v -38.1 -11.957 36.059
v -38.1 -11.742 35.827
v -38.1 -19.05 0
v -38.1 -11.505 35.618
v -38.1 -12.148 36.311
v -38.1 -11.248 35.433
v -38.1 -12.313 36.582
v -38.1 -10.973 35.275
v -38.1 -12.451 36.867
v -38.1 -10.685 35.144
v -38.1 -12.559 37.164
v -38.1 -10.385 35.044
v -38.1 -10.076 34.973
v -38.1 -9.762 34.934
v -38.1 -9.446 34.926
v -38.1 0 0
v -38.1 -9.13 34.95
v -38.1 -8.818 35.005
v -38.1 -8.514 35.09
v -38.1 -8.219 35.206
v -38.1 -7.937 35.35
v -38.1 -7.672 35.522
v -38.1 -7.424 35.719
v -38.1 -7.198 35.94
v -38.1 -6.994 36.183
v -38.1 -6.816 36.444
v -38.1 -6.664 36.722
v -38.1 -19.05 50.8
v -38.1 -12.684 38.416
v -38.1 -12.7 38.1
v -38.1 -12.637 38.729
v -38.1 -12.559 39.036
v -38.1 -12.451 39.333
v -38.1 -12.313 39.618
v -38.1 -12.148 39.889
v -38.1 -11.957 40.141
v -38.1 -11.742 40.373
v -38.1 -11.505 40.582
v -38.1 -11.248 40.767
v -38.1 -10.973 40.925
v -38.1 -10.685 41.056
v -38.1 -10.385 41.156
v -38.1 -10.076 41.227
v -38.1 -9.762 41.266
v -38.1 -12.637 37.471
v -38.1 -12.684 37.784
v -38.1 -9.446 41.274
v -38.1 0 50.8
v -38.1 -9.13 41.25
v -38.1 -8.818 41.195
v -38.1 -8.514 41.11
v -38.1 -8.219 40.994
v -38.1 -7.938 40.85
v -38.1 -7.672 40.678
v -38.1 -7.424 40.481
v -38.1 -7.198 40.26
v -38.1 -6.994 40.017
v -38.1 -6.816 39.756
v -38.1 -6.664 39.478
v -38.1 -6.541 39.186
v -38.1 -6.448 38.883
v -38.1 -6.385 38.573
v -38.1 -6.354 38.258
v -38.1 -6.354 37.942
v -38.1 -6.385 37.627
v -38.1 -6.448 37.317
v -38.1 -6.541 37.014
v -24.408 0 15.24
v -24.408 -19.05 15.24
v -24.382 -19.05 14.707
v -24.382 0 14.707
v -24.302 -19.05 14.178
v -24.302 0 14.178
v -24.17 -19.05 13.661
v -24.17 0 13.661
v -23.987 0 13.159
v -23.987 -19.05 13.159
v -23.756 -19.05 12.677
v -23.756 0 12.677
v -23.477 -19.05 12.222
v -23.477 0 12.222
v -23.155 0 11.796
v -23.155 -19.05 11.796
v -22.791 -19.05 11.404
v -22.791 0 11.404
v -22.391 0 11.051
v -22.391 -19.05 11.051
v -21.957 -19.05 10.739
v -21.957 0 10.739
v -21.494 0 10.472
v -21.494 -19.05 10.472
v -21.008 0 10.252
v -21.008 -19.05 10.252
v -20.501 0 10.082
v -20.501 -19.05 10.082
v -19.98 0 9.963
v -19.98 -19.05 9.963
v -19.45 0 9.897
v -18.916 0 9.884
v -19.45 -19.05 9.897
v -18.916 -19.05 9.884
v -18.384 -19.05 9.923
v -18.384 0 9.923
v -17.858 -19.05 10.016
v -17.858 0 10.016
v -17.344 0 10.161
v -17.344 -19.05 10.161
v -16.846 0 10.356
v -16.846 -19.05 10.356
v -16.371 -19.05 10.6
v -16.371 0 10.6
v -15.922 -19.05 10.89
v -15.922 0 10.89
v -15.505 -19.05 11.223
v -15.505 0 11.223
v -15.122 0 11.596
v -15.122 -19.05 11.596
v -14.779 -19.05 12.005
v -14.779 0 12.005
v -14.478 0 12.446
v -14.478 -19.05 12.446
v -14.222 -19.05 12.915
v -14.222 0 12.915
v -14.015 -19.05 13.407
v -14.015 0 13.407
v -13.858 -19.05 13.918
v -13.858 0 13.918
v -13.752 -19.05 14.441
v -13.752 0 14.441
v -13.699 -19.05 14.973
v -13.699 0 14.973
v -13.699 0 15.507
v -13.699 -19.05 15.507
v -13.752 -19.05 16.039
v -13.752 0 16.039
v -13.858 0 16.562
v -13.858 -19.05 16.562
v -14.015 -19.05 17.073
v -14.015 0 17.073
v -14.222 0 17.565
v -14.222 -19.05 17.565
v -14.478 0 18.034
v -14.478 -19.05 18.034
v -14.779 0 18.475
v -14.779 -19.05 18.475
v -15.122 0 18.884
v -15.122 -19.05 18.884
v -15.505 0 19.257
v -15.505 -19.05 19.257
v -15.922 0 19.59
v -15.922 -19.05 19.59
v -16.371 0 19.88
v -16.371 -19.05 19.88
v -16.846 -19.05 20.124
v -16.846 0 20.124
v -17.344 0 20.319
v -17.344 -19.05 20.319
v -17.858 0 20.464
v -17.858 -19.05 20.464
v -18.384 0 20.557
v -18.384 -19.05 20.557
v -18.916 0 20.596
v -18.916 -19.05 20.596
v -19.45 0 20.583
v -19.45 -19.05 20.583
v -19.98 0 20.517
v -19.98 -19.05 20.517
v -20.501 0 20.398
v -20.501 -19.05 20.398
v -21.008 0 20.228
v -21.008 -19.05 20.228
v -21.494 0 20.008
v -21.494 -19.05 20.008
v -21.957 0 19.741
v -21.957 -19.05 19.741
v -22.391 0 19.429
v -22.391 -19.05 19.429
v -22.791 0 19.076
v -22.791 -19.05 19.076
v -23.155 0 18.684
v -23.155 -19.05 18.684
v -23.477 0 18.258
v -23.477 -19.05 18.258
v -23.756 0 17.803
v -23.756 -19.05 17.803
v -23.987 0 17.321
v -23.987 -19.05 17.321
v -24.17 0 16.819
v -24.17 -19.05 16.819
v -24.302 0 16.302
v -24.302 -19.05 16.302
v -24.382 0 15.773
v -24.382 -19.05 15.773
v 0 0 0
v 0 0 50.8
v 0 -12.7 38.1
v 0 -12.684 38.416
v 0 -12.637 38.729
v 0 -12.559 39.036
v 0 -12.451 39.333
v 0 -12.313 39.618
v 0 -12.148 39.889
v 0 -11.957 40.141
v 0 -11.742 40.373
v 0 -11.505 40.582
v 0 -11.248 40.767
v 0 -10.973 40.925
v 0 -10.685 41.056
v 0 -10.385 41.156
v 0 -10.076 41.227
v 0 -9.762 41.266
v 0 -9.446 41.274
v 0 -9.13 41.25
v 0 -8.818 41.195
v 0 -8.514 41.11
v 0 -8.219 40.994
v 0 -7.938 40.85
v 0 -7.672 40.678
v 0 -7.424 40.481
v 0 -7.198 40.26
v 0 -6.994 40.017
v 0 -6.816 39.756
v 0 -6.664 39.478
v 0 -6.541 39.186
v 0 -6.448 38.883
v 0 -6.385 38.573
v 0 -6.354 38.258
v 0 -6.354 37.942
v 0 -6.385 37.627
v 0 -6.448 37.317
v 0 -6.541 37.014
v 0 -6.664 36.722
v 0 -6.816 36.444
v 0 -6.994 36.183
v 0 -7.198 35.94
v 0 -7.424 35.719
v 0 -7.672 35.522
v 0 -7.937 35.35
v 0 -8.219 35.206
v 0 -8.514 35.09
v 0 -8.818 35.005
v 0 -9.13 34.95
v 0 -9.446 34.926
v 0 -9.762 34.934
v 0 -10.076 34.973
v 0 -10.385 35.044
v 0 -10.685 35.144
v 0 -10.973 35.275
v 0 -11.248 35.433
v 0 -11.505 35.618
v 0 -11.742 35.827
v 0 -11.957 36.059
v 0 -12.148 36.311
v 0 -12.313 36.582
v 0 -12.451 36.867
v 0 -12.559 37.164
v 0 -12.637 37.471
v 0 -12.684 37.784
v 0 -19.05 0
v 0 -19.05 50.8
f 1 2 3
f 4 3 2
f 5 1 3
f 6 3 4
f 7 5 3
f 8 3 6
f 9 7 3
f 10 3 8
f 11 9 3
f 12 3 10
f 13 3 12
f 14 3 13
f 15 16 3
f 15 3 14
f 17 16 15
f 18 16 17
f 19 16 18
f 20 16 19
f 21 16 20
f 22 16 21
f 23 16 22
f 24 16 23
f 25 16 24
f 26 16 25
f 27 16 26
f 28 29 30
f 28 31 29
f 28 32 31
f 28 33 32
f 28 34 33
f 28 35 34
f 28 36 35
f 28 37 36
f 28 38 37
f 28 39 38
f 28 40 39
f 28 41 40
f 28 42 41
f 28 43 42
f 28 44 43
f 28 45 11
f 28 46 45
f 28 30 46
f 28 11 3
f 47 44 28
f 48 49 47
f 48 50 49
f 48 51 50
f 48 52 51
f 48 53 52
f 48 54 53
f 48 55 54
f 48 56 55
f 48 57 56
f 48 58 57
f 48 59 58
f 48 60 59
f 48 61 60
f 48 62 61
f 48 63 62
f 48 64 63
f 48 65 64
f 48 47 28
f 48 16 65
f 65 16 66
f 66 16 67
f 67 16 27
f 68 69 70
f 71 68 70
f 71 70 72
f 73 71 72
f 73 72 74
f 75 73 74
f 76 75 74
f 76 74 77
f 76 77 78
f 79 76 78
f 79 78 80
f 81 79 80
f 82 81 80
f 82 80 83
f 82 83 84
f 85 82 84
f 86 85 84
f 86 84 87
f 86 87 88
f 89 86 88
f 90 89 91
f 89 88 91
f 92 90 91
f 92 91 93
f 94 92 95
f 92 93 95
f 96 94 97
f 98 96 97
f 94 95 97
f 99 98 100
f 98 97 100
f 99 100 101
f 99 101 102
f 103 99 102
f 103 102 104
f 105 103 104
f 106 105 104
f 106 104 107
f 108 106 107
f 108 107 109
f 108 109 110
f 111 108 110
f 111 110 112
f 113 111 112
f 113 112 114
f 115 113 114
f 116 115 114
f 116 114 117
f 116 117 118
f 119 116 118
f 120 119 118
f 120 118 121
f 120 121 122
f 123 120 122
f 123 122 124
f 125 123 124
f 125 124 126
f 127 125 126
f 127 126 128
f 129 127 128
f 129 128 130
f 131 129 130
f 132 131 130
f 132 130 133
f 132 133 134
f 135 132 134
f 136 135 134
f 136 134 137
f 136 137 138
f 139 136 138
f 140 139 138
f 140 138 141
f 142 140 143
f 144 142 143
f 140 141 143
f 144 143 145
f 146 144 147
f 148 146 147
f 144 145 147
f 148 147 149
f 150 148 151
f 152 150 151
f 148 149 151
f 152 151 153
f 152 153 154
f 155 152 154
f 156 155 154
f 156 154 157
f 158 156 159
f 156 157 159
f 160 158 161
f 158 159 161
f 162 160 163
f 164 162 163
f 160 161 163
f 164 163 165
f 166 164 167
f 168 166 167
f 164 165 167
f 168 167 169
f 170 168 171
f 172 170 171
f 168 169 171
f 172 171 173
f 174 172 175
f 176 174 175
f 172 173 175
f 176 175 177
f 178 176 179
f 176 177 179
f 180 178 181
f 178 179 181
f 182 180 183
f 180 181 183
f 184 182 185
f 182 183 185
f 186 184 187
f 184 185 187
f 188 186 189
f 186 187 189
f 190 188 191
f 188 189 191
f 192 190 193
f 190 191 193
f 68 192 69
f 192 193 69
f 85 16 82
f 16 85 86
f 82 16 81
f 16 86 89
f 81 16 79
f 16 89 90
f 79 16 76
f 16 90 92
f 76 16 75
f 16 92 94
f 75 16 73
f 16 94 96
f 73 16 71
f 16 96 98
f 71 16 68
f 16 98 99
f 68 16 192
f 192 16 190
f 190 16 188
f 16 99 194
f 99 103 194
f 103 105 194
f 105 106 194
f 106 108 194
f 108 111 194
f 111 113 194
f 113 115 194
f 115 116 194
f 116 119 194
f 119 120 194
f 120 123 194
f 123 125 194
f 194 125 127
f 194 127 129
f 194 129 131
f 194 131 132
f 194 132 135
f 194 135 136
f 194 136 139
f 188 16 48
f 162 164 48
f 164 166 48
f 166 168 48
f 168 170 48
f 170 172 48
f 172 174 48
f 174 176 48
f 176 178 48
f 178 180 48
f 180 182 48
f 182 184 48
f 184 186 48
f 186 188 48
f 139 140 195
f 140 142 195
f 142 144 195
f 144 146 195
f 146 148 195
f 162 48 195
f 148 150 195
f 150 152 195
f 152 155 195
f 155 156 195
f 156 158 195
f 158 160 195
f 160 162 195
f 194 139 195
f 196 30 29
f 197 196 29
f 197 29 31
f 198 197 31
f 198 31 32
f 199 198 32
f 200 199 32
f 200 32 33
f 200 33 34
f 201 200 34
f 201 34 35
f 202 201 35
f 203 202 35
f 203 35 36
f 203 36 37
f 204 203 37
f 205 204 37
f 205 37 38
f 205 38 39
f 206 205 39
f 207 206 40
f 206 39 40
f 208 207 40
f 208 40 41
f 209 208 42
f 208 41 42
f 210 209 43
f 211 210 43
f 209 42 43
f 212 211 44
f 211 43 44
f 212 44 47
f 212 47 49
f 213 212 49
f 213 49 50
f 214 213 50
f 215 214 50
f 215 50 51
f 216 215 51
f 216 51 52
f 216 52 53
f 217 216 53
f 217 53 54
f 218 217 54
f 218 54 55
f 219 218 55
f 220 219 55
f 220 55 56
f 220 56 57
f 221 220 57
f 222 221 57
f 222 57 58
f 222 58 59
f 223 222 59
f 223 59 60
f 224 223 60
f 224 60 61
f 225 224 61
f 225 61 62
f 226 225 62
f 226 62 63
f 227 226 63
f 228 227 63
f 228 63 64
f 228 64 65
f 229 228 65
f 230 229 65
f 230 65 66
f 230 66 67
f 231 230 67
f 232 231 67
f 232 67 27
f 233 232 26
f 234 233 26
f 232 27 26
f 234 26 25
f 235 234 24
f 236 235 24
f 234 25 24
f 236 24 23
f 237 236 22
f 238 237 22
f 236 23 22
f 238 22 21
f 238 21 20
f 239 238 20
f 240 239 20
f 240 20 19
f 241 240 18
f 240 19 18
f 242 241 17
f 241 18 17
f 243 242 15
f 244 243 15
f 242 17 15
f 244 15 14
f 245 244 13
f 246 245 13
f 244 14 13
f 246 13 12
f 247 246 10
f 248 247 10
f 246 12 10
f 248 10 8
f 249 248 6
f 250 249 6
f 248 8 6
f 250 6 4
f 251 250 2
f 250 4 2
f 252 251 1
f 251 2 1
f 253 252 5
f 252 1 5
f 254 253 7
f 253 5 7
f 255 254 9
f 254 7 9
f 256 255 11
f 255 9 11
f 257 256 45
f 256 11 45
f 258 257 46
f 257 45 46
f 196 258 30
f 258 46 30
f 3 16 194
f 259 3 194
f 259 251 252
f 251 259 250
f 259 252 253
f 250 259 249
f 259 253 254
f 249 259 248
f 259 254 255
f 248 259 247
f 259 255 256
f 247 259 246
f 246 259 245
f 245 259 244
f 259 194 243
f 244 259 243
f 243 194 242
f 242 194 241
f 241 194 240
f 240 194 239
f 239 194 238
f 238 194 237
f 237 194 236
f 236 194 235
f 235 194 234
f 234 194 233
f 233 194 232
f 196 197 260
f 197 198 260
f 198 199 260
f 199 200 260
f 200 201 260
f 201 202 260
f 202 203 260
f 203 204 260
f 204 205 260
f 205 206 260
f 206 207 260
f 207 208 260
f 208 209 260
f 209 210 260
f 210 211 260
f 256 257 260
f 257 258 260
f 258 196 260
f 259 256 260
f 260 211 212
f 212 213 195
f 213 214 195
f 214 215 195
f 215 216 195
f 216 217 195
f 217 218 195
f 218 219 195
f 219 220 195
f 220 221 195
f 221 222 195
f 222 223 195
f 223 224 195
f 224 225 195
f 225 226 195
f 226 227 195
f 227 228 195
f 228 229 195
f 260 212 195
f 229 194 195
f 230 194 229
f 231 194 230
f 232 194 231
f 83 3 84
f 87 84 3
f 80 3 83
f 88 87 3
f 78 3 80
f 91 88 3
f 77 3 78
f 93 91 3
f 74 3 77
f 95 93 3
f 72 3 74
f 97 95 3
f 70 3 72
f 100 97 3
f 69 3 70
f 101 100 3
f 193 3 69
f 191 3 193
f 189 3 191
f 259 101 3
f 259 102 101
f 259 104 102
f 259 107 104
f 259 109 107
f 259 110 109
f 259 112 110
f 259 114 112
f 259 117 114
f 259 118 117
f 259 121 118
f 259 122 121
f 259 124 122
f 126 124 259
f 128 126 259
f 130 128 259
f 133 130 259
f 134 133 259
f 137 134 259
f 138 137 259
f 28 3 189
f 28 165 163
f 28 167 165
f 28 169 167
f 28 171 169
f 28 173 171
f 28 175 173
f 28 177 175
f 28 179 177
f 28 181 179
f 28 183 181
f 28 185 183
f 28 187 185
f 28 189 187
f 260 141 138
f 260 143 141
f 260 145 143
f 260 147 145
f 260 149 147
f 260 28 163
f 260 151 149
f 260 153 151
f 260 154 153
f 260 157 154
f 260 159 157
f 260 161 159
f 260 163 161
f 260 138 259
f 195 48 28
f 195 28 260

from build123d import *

# Parameters (mm, degrees)
F0_W     = 38.1
F0_H     = 50.8
F1_DEPTH = 19.05
F3_D     = 6.35
F4_D     = 10.71626


with BuildPart() as f1:
    # F0 (on Front) → F1 (new body)
    with BuildSketch(Plane.XZ):
        with Locations((-19.05, 25.4)):
            Rectangle(F0_W, F0_H)
    extrude(amount=F1_DEPTH)

    # F3 (through all)
    with Locations(Plane.YZ):
        with Locations((-9.525, 38.1)):
            Hole(F3_D / 2)

    # F4 (through all)
    with Locations(Plane(origin=(0, 0, 0), x_dir=(1, 0, 0), z_dir=(0, 1, 0))):
        with Locations((-19.05, -15.24)):
            Hole(F4_D / 2)


solid = f1.part
